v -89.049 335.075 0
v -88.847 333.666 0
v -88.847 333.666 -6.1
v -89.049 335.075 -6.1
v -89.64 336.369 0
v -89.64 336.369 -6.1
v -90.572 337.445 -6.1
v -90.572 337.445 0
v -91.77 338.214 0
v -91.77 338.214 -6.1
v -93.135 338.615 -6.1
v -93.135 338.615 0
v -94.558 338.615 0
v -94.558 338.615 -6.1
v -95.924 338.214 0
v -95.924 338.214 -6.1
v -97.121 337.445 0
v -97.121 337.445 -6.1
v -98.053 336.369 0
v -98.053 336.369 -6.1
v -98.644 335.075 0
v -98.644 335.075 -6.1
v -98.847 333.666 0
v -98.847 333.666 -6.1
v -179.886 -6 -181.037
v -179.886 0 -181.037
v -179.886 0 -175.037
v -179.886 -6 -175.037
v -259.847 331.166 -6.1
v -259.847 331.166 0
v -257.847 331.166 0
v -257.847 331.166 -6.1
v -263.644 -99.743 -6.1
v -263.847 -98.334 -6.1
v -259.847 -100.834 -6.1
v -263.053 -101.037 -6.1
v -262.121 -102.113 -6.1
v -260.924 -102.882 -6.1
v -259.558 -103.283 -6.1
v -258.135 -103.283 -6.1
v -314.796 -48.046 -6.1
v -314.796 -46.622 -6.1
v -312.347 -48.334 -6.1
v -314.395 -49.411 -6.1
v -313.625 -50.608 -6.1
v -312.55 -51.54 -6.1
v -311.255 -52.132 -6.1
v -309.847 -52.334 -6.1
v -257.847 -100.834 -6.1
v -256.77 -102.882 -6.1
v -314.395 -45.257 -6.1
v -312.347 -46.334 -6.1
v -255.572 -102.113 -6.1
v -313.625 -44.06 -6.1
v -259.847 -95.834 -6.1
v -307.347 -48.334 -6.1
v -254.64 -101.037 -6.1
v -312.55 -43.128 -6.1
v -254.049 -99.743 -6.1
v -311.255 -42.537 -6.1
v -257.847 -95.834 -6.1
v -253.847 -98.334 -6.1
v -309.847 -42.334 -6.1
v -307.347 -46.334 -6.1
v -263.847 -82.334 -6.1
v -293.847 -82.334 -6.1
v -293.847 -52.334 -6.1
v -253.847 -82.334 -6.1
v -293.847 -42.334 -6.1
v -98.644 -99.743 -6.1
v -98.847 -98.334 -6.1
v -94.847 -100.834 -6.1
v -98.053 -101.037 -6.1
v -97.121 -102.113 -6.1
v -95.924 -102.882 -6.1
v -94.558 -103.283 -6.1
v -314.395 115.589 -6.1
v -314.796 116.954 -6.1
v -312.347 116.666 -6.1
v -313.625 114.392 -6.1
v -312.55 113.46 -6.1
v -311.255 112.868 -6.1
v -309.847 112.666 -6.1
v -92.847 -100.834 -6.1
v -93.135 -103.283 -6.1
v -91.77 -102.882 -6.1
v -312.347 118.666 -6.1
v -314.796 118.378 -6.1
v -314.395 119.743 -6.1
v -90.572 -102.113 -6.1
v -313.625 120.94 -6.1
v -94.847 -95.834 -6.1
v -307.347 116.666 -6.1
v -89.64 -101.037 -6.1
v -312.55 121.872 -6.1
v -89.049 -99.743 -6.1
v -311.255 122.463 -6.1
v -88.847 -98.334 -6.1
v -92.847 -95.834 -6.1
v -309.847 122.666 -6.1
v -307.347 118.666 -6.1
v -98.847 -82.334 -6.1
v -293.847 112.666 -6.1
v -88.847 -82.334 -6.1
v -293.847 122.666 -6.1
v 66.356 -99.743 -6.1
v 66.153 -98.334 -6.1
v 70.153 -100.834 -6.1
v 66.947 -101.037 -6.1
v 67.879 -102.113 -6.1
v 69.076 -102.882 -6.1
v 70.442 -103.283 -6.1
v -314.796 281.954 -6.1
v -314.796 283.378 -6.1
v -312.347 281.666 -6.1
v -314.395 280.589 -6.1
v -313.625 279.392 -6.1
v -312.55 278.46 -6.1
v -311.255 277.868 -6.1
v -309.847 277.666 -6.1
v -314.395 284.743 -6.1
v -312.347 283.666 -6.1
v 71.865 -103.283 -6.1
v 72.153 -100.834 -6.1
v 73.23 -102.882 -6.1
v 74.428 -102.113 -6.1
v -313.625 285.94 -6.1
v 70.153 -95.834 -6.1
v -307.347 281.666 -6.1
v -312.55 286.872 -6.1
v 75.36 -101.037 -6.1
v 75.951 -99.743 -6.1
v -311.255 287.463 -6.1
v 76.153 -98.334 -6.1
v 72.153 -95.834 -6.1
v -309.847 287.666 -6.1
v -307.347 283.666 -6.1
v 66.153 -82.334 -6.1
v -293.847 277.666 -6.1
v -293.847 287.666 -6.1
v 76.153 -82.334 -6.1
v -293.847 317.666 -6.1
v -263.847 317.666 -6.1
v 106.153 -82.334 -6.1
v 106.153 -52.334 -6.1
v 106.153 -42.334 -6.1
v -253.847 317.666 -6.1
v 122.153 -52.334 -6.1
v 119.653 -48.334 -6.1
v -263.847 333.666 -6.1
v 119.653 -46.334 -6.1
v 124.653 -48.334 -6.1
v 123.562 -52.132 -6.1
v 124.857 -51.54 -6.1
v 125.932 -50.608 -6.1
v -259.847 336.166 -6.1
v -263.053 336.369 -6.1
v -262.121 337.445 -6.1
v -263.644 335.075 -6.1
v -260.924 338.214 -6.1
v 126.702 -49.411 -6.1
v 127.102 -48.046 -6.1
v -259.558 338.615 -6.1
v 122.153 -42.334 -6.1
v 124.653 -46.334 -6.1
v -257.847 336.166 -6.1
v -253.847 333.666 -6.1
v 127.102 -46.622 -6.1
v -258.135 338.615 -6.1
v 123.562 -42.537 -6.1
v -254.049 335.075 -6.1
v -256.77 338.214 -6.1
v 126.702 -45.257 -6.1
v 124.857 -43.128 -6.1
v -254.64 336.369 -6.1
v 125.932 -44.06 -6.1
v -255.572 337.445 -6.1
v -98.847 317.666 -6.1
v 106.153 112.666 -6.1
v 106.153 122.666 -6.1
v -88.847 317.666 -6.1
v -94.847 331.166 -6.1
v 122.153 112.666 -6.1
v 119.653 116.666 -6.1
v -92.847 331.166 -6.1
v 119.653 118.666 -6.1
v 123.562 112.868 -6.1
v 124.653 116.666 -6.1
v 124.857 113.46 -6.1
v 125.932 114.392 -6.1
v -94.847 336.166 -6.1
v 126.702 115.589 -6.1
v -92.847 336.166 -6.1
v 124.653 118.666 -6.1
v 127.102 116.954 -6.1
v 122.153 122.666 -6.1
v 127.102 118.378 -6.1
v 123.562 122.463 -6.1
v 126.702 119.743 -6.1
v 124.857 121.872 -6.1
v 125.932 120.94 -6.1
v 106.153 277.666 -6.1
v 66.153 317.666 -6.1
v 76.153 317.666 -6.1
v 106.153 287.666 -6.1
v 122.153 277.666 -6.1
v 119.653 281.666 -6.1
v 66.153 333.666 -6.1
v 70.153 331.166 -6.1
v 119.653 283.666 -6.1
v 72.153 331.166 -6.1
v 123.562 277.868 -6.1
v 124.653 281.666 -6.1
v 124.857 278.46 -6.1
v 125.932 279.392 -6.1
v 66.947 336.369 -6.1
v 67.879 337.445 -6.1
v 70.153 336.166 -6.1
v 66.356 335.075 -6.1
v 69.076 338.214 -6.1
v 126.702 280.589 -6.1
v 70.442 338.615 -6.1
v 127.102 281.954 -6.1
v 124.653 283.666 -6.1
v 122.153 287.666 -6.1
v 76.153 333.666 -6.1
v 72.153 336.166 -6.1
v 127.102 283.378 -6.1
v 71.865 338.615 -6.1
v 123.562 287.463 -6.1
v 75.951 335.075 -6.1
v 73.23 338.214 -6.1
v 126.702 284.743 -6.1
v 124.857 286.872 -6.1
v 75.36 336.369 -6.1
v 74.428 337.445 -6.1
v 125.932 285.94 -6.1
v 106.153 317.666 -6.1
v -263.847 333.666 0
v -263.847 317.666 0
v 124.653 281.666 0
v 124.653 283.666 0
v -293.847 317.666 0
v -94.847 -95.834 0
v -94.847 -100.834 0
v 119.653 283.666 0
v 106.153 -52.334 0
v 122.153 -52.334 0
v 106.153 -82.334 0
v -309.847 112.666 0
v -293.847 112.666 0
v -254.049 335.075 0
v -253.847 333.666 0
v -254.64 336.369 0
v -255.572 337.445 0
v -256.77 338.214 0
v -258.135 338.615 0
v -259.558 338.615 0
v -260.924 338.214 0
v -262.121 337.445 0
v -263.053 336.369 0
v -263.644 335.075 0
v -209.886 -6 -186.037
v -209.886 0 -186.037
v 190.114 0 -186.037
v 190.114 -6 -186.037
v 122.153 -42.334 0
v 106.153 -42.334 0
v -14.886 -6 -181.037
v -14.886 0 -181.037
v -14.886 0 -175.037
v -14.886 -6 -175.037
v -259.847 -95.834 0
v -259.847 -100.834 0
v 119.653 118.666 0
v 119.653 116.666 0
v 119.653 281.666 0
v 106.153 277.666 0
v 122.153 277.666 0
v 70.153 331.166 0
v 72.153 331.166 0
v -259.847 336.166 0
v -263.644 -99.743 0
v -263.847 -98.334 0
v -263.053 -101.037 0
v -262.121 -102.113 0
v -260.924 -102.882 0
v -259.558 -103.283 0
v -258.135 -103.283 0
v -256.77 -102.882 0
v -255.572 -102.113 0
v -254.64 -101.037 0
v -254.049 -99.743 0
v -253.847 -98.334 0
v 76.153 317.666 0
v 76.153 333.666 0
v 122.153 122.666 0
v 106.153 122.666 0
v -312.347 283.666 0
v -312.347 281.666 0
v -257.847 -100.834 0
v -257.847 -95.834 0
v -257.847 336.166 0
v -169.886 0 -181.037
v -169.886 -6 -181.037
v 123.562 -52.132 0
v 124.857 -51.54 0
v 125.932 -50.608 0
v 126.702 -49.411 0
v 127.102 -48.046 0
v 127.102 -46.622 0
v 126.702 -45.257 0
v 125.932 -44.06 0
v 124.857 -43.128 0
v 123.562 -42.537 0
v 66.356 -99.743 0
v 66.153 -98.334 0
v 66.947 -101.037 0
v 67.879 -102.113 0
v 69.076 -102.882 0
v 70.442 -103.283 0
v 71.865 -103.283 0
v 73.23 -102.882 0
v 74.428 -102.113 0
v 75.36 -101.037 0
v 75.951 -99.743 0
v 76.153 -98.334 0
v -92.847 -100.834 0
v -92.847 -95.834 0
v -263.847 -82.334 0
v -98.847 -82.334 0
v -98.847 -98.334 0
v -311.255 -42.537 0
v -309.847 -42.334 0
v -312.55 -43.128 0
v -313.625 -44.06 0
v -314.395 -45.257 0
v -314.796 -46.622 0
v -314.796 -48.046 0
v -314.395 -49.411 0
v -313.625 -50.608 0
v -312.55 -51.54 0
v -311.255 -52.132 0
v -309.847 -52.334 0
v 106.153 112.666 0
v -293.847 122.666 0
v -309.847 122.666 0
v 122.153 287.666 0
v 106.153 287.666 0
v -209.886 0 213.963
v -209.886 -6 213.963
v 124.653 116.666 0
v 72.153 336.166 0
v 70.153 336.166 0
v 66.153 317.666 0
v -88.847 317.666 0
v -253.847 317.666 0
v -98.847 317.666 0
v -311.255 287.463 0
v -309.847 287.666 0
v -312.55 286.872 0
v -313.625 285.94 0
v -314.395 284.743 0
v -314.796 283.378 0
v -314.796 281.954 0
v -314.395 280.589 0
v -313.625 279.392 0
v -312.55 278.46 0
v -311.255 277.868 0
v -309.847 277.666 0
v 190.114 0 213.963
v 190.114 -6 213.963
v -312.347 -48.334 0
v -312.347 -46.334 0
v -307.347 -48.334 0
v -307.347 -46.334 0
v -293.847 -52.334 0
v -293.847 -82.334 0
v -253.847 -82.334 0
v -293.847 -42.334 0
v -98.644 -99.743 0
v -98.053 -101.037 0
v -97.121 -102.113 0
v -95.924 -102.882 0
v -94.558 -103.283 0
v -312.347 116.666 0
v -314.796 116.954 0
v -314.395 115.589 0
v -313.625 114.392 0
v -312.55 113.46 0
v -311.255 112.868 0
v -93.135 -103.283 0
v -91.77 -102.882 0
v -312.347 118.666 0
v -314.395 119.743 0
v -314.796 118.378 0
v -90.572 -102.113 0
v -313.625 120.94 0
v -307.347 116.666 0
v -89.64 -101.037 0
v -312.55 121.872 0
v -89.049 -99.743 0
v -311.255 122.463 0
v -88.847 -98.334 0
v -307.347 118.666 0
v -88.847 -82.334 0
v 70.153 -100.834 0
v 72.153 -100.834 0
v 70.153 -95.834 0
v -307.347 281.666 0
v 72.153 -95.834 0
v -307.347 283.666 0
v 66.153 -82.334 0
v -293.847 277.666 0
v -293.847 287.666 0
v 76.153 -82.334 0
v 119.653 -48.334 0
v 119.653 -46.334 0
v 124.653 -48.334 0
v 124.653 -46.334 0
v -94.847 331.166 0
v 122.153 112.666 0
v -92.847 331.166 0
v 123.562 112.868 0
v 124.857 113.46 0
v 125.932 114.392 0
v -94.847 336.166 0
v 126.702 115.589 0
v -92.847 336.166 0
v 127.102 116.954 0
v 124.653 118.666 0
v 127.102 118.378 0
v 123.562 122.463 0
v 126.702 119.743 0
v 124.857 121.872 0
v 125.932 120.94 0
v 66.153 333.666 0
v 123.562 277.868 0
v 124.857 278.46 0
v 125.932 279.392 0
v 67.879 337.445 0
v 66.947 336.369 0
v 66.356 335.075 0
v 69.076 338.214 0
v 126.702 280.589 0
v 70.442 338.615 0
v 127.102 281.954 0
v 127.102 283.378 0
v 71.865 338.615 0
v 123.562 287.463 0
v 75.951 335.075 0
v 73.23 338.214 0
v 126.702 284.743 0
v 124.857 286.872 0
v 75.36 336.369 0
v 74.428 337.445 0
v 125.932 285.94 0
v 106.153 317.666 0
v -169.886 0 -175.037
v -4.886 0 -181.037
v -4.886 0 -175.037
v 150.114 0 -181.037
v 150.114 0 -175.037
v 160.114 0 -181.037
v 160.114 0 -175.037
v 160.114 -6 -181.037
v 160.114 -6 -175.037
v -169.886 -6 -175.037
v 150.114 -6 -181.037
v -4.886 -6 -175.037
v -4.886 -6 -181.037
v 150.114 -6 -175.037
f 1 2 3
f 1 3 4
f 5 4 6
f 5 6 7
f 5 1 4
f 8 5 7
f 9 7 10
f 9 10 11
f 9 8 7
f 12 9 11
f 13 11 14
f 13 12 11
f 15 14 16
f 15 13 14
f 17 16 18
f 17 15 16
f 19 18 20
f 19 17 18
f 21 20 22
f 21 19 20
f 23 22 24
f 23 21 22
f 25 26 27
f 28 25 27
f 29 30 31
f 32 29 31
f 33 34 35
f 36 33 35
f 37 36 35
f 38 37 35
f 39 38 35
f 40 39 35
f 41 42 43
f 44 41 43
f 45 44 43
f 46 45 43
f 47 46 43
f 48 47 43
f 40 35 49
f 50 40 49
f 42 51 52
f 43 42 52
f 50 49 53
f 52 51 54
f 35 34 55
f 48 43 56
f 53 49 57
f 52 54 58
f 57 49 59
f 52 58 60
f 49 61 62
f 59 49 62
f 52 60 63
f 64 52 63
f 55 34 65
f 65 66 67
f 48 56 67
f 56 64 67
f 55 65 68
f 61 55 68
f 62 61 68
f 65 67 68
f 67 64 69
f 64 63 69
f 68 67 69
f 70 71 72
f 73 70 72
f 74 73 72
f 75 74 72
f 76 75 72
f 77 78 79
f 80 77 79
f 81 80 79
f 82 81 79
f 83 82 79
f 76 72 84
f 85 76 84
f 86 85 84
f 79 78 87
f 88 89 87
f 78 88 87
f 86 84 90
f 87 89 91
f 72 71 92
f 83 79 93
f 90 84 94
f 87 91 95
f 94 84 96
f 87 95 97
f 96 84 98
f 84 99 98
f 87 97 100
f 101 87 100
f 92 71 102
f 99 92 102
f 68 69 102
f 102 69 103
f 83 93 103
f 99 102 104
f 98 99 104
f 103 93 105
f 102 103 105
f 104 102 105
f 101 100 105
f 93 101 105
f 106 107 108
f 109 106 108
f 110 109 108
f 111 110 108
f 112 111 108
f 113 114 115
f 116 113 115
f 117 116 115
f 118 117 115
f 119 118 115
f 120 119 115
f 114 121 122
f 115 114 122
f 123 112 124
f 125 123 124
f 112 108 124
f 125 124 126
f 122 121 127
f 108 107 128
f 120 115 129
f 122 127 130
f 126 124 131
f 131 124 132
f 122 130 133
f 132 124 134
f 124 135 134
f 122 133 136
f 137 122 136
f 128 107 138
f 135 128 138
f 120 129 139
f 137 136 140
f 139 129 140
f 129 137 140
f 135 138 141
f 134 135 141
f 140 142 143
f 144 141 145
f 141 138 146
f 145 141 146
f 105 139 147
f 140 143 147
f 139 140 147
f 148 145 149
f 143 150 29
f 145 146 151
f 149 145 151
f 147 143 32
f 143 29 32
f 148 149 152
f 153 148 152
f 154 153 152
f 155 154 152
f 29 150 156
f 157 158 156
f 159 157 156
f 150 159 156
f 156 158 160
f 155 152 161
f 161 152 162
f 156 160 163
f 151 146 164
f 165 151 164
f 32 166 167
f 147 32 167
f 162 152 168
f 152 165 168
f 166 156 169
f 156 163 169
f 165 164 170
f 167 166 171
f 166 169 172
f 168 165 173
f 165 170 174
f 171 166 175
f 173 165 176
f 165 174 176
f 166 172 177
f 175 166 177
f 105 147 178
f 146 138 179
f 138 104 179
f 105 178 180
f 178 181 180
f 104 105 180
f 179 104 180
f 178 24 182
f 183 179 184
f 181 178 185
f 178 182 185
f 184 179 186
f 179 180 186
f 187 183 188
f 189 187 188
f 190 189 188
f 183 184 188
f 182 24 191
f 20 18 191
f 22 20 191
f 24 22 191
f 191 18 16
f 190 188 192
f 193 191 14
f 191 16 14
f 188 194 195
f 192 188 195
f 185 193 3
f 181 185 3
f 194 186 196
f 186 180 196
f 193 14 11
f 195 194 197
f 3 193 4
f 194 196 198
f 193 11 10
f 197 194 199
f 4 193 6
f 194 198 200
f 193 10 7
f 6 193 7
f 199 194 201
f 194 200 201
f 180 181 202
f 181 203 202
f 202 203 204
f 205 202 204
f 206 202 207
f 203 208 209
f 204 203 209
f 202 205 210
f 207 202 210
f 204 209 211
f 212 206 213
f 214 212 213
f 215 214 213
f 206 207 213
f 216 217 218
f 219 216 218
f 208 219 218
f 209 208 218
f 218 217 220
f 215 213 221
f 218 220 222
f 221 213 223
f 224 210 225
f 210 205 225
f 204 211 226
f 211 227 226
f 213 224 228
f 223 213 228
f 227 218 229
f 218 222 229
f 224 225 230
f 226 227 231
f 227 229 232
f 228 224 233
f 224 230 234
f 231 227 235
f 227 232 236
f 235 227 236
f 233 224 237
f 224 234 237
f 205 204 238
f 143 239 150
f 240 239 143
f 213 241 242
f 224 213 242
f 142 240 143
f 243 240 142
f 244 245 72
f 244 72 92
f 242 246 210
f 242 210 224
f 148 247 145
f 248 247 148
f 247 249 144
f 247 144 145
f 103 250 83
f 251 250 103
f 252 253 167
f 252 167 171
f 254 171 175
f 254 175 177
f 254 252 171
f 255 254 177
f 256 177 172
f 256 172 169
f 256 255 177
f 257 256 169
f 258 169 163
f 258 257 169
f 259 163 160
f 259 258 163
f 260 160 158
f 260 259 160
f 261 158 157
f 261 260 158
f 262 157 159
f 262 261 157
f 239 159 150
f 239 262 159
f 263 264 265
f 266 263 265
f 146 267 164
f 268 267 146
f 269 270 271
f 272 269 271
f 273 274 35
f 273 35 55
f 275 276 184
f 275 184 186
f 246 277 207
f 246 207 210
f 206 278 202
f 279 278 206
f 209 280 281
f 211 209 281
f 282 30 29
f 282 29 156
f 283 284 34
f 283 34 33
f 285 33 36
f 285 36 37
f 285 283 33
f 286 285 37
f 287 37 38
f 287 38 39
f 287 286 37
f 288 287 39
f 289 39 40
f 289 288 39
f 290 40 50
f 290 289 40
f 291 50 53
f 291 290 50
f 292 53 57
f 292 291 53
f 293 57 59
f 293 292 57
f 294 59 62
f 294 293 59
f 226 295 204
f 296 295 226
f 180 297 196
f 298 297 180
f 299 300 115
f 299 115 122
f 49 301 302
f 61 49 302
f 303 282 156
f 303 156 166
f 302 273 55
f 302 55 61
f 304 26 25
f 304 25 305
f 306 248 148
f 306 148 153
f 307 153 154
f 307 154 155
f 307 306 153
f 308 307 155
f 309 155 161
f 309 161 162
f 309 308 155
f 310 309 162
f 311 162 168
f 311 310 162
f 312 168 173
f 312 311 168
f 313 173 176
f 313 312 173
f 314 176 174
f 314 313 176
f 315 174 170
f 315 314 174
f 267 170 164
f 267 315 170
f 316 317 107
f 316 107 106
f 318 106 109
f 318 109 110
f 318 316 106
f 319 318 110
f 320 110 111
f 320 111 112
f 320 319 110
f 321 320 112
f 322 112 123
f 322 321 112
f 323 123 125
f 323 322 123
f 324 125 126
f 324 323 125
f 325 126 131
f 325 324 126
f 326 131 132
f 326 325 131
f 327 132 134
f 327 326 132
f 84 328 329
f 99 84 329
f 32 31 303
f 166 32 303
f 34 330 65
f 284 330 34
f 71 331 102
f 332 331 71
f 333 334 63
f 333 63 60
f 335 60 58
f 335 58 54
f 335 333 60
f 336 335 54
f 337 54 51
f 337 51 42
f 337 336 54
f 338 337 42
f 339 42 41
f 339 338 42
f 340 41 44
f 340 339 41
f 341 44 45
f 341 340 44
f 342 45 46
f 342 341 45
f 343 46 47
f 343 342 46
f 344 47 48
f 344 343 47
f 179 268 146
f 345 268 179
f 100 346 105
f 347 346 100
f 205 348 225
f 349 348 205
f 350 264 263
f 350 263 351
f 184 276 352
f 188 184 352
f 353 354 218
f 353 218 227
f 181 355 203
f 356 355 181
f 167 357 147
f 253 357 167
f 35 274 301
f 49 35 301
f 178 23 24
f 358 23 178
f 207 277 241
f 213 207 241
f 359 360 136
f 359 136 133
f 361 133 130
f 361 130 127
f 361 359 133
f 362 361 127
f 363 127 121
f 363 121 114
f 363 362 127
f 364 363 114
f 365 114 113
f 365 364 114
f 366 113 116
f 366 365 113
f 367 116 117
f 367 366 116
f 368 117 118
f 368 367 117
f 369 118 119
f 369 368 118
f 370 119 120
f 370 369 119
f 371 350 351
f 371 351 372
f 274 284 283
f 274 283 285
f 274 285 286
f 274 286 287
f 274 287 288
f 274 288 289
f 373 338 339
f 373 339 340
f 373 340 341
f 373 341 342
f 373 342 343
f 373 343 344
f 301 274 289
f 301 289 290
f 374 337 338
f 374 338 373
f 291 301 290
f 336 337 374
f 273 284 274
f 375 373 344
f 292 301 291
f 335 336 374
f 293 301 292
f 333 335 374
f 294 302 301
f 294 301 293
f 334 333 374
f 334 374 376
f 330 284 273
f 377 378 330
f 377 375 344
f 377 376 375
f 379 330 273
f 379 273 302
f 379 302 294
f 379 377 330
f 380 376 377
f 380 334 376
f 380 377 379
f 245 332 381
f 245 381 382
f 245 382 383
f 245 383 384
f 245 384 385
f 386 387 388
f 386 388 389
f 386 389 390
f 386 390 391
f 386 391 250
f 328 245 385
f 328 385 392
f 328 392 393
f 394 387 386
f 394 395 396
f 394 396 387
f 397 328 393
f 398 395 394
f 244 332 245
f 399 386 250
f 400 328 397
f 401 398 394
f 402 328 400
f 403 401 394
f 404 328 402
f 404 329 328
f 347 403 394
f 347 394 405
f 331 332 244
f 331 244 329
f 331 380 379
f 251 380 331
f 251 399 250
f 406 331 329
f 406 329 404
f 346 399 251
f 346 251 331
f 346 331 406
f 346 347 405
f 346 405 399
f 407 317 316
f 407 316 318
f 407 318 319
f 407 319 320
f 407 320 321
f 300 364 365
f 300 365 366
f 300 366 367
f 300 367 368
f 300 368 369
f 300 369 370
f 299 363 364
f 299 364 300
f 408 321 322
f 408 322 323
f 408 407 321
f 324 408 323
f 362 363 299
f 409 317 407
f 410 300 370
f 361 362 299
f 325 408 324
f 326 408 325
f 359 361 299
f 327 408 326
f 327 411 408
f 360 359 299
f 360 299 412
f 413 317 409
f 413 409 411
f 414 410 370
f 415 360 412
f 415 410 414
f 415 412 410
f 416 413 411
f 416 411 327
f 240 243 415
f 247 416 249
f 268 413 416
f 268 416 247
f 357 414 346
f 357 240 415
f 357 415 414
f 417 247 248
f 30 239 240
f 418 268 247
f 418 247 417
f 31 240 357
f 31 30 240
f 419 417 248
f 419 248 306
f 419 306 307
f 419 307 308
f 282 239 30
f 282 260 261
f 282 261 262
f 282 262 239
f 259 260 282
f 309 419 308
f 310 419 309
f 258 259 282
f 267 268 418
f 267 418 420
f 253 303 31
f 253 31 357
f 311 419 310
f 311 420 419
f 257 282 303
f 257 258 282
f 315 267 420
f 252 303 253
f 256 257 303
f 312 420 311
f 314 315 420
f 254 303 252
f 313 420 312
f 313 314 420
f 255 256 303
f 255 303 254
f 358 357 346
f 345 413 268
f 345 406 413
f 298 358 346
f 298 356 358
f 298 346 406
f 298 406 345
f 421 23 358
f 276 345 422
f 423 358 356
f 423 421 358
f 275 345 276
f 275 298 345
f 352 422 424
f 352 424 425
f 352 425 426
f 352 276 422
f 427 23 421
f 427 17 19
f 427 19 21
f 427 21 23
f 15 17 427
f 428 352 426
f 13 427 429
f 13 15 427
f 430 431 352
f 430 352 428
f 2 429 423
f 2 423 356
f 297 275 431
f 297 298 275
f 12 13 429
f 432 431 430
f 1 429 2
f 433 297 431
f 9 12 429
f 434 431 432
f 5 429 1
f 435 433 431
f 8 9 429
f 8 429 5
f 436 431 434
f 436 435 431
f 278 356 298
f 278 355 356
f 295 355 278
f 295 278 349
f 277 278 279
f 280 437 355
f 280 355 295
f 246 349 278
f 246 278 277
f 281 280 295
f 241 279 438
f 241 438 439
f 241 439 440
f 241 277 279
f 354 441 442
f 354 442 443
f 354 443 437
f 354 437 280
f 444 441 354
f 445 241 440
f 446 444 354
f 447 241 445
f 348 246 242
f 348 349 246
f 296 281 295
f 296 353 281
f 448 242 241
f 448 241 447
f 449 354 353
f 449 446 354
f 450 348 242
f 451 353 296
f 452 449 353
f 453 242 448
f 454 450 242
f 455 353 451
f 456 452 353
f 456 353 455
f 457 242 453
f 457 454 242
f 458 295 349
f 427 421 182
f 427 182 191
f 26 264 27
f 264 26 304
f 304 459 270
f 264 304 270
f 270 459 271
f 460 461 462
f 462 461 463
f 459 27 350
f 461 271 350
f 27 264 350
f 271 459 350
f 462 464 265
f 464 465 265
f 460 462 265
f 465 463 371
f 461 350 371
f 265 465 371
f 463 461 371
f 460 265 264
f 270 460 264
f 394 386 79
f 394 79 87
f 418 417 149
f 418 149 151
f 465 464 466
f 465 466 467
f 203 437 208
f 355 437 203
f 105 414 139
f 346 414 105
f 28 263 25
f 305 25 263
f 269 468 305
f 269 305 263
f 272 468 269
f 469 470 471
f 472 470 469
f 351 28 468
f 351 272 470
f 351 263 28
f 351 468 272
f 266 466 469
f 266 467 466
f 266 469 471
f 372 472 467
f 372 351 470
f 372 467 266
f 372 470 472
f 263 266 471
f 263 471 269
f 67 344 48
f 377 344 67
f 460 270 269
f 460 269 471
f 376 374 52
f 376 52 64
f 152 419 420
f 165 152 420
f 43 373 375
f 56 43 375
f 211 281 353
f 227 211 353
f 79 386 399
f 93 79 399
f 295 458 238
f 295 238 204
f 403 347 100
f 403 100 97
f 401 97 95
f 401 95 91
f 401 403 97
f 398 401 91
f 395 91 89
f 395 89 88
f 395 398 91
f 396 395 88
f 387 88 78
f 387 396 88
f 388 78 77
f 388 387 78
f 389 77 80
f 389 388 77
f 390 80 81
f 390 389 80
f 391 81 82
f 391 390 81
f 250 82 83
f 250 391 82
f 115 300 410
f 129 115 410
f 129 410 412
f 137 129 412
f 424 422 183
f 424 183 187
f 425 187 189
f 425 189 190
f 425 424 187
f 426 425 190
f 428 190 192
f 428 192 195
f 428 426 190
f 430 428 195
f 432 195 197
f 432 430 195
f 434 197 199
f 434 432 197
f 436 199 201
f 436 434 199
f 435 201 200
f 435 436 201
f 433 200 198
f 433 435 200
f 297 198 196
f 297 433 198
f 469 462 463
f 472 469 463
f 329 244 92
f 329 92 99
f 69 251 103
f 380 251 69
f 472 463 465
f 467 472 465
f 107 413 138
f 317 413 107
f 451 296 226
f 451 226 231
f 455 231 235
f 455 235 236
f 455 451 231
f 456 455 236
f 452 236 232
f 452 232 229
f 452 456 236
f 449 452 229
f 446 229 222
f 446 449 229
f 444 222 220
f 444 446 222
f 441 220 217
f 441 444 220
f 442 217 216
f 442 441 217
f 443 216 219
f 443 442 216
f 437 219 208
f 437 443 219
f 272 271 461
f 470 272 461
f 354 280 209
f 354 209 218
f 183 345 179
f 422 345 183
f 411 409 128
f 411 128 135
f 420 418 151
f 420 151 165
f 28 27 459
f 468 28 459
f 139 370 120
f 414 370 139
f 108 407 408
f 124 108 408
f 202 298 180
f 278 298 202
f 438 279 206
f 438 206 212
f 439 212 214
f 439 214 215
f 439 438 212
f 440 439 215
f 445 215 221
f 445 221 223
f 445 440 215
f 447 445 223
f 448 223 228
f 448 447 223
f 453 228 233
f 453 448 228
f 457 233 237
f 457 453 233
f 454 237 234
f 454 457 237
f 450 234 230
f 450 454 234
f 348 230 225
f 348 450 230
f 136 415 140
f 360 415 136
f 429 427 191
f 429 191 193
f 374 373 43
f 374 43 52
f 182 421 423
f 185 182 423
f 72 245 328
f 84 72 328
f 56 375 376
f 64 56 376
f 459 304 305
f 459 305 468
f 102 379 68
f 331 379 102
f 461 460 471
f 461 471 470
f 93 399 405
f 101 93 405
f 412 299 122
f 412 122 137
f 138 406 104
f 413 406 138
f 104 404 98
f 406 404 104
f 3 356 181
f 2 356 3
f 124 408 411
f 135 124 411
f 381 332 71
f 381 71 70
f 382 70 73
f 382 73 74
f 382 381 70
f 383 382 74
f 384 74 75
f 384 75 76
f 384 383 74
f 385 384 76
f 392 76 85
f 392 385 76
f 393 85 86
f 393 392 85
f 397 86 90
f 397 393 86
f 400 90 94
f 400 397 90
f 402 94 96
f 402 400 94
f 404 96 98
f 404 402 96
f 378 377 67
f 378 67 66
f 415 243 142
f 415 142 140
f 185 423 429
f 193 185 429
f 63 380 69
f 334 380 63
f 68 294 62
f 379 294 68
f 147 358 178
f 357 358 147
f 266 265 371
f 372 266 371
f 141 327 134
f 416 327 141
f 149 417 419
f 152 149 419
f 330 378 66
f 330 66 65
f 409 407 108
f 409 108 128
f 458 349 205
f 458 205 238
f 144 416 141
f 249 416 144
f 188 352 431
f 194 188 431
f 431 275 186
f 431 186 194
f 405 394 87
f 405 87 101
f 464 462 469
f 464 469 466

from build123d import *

# Parameters (mm, degrees)
F0_W     = 5
F0_H     = 2
F0_W_2   = 2
F0_H_2   = 5
F1_DEPTH = 6.1
F2_W     = 400
F2_H     = 400
F2_W_2   = 10
F2_H_2   = 6
F3_DEPTH = 6


# Not quite as in the source:
# - a feature names something its author has since deleted; it is built from what else it names


with BuildPart() as f1:
    # F0 (on Top) → F1 (new body)
    with BuildSketch(Plane.XY):
        Polygon((-263.8466370106, 317.6659622788), (-293.8466370106, 317.6659622788), (-293.8466370106, 287.6659622788), (-293.8466370106, 277.6659622788), (-293.8466370106, 122.6659622788), (-293.8466370106, 112.6659622788), (-293.8466370106, -42.3340377212), (-293.8466370106, -52.3340377212), (-293.8466370106, -82.3340377212), (-263.8466370106, -82.3340377212), (-253.8466370106, -82.3340377212), (-98.8466370106, -82.3340377212), (-88.8466370106, -82.3340377212), (66.1533629894, -82.3340377212), (76.1533629894, -82.3340377212), (106.1533629894, -82.3340377212), (106.1533629894, -52.3340377212), (106.1533629894, -42.3340377212), (106.1533629894, 112.6659622788), (106.1533629894, 122.6659622788), (106.1533629894, 277.6659622788), (106.1533629894, 287.6659622788), (106.1533629894, 317.6659622788), (76.1533629894, 317.6659622788), (66.1533629894, 317.6659622788), (-88.8466370106, 317.6659622788), (-98.8466370106, 317.6659622788), (-253.8466370106, 317.6659622788), align=None)
        with BuildLine():
            Line((-293.8466370106, -52.3340377212), (-293.8466370106, -42.3340377212))
            Line((-293.8466370106, -42.3340377212), (-309.8466370106, -42.3340377212))
            ThreePointArc((-309.8466370106, -42.3340377212), (-314.8466370106, -47.3340377212), (-309.8466370106, -52.3340377212))
            Line((-309.8466370106, -52.3340377212), (-293.8466370106, -52.3340377212))
        make_face()
        with Locations((-309.8466370106, -47.3340377212)):
            Rectangle(F0_W, F0_H, mode=Mode.SUBTRACT)
        with BuildLine():
            Line((-293.8466370106, 112.6659622788), (-293.8466370106, 122.6659622788))
            Line((-293.8466370106, 122.6659622788), (-309.8466370106, 122.6659622788))
            ThreePointArc((-309.8466370106, 122.6659622788), (-314.8466370106, 117.6659622788), (-309.8466370106, 112.6659622788))
            Line((-309.8466370106, 112.6659622788), (-293.8466370106, 112.6659622788))
        make_face()
        with Locations((-309.8466370106, 117.6659622788)):
            Rectangle(F0_W, F0_H, mode=Mode.SUBTRACT)
        with BuildLine():
            Line((-293.8466370106, 277.6659622788), (-293.8466370106, 287.6659622788))
            Line((-293.8466370106, 287.6659622788), (-309.8466370106, 287.6659622788))
            ThreePointArc((-309.8466370106, 287.6659622788), (-314.8466370106, 282.6659622788), (-309.8466370106, 277.6659622788))
            Line((-309.8466370106, 277.6659622788), (-293.8466370106, 277.6659622788))
        make_face()
        with Locations((-309.8466370106, 282.6659622788)):
            Rectangle(F0_W, F0_H, mode=Mode.SUBTRACT)
        with BuildLine():
            Line((122.1533629894, -42.3340377212), (106.1533629894, -42.3340377212))
            Line((106.1533629894, -42.3340377212), (106.1533629894, -52.3340377212))
            Line((106.1533629894, -52.3340377212), (122.1533629894, -52.3340377212))
            ThreePointArc((122.1533629894, -52.3340377212), (127.1533629894, -47.3340377212), (122.1533629894, -42.3340377212))
        make_face()
        with Locations((122.1533629894, -47.3340377212)):
            Rectangle(F0_W, F0_H, mode=Mode.SUBTRACT)
        with BuildLine():
            Line((122.1533629894, 122.6659622788), (106.1533629894, 122.6659622788))
            Line((106.1533629894, 122.6659622788), (106.1533629894, 112.6659622788))
            Line((106.1533629894, 112.6659622788), (122.1533629894, 112.6659622788))
            ThreePointArc((122.1533629894, 112.6659622788), (127.1533629894, 117.6659622788), (122.1533629894, 122.6659622788))
        make_face()
        with Locations((122.1533629894, 117.6659622788)):
            Rectangle(F0_W, F0_H, mode=Mode.SUBTRACT)
        with BuildLine():
            Line((122.1533629894, 287.6659622788), (106.1533629894, 287.6659622788))
            Line((106.1533629894, 287.6659622788), (106.1533629894, 277.6659622788))
            Line((106.1533629894, 277.6659622788), (122.1533629894, 277.6659622788))
            ThreePointArc((122.1533629894, 277.6659622788), (127.1533629894, 282.6659622788), (122.1533629894, 287.6659622788))
        make_face()
        with Locations((122.1533629894, 282.6659622788)):
            Rectangle(F0_W, F0_H, mode=Mode.SUBTRACT)
        with BuildLine():
            Line((-253.8466370106, -82.3340377212), (-263.8466370106, -82.3340377212))
            Line((-263.8466370106, -82.3340377212), (-263.8466370106, -98.3340377212))
            ThreePointArc((-263.8466370106, -98.3340377212), (-258.8466370106, -103.3340377212), (-253.8466370106, -98.3340377212))
            Line((-253.8466370106, -98.3340377212), (-253.8466370106, -82.3340377212))
        make_face()
        with Locations((-258.8466370106, -98.3340377212)):
            Rectangle(F0_W_2, F0_H_2, mode=Mode.SUBTRACT)
        with BuildLine():
            Line((-88.8466370106, -82.3340377212), (-98.8466370106, -82.3340377212))
            Line((-98.8466370106, -82.3340377212), (-98.8466370106, -98.3340377212))
            ThreePointArc((-98.8466370106, -98.3340377212), (-93.8466370106, -103.3340377212), (-88.8466370106, -98.3340377212))
            Line((-88.8466370106, -98.3340377212), (-88.8466370106, -82.3340377212))
        make_face()
        with Locations((-93.8466370106, -98.3340377212)):
            Rectangle(F0_W_2, F0_H_2, mode=Mode.SUBTRACT)
        with BuildLine():
            Line((76.1533629894, -82.3340377212), (66.1533629894, -82.3340377212))
            Line((66.1533629894, -82.3340377212), (66.1533629894, -98.3340377212))
            ThreePointArc((66.1533629894, -98.3340377212), (71.1533629894, -103.3340377212), (76.1533629894, -98.3340377212))
            Line((76.1533629894, -98.3340377212), (76.1533629894, -82.3340377212))
        make_face()
        with Locations((71.1533629894, -98.3340377212)):
            Rectangle(F0_W_2, F0_H_2, mode=Mode.SUBTRACT)
        with BuildLine():
            Line((66.1533629894, 333.6659622788), (66.1533629894, 317.6659622788))
            Line((66.1533629894, 317.6659622788), (76.1533629894, 317.6659622788))
            Line((76.1533629894, 317.6659622788), (76.1533629894, 333.6659622788))
            ThreePointArc((76.1533629894, 333.6659622788), (71.1533629894, 338.6659622788), (66.1533629894, 333.6659622788))
        make_face()
        with Locations((71.1533629894, 333.6659622788)):
            Rectangle(F0_W_2, F0_H_2, mode=Mode.SUBTRACT)
        with BuildLine():
            Line((-98.8466370106, 333.6659622788), (-98.8466370106, 317.6659622788))
            Line((-98.8466370106, 317.6659622788), (-88.8466370106, 317.6659622788))
            Line((-88.8466370106, 317.6659622788), (-88.8466370106, 333.6659622788))
            ThreePointArc((-88.8466370106, 333.6659622788), (-93.8466370106, 338.6659622788), (-98.8466370106, 333.6659622788))
        make_face()
        with Locations((-93.8466370106, 333.6659622788)):
            Rectangle(F0_W_2, F0_H_2, mode=Mode.SUBTRACT)
        with BuildLine():
            Line((-263.8466370106, 333.6659622788), (-263.8466370106, 317.6659622788))
            Line((-263.8466370106, 317.6659622788), (-253.8466370106, 317.6659622788))
            Line((-253.8466370106, 317.6659622788), (-253.8466370106, 333.6659622788))
            ThreePointArc((-253.8466370106, 333.6659622788), (-258.8466370106, 338.6659622788), (-263.8466370106, 333.6659622788))
        make_face()
        with Locations((-258.8466370106, 333.6659622788)):
            Rectangle(F0_W_2, F0_H_2, mode=Mode.SUBTRACT)
    extrude(amount=-F1_DEPTH)


with BuildPart() as f3:
    # F2 (on Front) → F3 (new body)
    with BuildSketch(Plane.XZ):
        with Locations((-9.8858773708, 13.9629530753)):
            Rectangle(F2_W, F2_H)
        with Locations((-174.8858773708, -178.0370469247)):
            Rectangle(F2_W_2, F2_H_2, mode=Mode.SUBTRACT)
        with Locations((-9.8858773708, -178.0370469247)):
            Rectangle(F2_W_2, F2_H_2, mode=Mode.SUBTRACT)
        with Locations((155.1141226292, -178.0370469247)):
            Rectangle(F2_W_2, F2_H_2, mode=Mode.SUBTRACT)
    extrude(amount=F3_DEPTH)


solid = Compound([f1.part, f3.part])
